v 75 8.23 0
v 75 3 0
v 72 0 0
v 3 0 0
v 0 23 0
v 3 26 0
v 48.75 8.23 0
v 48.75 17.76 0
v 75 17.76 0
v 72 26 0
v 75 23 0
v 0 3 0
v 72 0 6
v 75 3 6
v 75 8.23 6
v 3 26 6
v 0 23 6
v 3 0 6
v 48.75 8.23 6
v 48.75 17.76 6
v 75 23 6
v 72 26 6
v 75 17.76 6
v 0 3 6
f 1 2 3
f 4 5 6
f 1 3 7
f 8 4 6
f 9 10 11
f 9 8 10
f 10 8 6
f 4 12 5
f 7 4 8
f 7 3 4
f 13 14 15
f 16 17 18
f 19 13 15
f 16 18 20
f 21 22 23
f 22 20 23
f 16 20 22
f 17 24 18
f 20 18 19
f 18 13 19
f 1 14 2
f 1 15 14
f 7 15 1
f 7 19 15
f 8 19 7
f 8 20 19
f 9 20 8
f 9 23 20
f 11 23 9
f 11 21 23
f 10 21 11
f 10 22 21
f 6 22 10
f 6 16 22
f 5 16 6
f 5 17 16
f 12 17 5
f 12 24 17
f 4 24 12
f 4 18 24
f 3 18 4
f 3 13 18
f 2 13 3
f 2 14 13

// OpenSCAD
$fn = 32;

// ----------------------------------------------------------------------
// C washer: 75 x 26 mm plate with an open slot
// ----------------------------------------------------------------------

// --- parameters (mm) ---
profile_height = 6;       // extrusion height
profile_points = 12;      // points of the closed outline

profile = [[3, 0], [72, 0], [75, 3], [75, 8.23], [48.75, 8.23], [48.75, 17.76], [75, 17.76], [75, 23], [72, 26], [3, 26], [0, 23], [0, 3]];  // single closed polygon, 12 points, counter clockwise

// --- the one profile operation ---
linear_extrude(height = profile_height) polygon(points = profile);
